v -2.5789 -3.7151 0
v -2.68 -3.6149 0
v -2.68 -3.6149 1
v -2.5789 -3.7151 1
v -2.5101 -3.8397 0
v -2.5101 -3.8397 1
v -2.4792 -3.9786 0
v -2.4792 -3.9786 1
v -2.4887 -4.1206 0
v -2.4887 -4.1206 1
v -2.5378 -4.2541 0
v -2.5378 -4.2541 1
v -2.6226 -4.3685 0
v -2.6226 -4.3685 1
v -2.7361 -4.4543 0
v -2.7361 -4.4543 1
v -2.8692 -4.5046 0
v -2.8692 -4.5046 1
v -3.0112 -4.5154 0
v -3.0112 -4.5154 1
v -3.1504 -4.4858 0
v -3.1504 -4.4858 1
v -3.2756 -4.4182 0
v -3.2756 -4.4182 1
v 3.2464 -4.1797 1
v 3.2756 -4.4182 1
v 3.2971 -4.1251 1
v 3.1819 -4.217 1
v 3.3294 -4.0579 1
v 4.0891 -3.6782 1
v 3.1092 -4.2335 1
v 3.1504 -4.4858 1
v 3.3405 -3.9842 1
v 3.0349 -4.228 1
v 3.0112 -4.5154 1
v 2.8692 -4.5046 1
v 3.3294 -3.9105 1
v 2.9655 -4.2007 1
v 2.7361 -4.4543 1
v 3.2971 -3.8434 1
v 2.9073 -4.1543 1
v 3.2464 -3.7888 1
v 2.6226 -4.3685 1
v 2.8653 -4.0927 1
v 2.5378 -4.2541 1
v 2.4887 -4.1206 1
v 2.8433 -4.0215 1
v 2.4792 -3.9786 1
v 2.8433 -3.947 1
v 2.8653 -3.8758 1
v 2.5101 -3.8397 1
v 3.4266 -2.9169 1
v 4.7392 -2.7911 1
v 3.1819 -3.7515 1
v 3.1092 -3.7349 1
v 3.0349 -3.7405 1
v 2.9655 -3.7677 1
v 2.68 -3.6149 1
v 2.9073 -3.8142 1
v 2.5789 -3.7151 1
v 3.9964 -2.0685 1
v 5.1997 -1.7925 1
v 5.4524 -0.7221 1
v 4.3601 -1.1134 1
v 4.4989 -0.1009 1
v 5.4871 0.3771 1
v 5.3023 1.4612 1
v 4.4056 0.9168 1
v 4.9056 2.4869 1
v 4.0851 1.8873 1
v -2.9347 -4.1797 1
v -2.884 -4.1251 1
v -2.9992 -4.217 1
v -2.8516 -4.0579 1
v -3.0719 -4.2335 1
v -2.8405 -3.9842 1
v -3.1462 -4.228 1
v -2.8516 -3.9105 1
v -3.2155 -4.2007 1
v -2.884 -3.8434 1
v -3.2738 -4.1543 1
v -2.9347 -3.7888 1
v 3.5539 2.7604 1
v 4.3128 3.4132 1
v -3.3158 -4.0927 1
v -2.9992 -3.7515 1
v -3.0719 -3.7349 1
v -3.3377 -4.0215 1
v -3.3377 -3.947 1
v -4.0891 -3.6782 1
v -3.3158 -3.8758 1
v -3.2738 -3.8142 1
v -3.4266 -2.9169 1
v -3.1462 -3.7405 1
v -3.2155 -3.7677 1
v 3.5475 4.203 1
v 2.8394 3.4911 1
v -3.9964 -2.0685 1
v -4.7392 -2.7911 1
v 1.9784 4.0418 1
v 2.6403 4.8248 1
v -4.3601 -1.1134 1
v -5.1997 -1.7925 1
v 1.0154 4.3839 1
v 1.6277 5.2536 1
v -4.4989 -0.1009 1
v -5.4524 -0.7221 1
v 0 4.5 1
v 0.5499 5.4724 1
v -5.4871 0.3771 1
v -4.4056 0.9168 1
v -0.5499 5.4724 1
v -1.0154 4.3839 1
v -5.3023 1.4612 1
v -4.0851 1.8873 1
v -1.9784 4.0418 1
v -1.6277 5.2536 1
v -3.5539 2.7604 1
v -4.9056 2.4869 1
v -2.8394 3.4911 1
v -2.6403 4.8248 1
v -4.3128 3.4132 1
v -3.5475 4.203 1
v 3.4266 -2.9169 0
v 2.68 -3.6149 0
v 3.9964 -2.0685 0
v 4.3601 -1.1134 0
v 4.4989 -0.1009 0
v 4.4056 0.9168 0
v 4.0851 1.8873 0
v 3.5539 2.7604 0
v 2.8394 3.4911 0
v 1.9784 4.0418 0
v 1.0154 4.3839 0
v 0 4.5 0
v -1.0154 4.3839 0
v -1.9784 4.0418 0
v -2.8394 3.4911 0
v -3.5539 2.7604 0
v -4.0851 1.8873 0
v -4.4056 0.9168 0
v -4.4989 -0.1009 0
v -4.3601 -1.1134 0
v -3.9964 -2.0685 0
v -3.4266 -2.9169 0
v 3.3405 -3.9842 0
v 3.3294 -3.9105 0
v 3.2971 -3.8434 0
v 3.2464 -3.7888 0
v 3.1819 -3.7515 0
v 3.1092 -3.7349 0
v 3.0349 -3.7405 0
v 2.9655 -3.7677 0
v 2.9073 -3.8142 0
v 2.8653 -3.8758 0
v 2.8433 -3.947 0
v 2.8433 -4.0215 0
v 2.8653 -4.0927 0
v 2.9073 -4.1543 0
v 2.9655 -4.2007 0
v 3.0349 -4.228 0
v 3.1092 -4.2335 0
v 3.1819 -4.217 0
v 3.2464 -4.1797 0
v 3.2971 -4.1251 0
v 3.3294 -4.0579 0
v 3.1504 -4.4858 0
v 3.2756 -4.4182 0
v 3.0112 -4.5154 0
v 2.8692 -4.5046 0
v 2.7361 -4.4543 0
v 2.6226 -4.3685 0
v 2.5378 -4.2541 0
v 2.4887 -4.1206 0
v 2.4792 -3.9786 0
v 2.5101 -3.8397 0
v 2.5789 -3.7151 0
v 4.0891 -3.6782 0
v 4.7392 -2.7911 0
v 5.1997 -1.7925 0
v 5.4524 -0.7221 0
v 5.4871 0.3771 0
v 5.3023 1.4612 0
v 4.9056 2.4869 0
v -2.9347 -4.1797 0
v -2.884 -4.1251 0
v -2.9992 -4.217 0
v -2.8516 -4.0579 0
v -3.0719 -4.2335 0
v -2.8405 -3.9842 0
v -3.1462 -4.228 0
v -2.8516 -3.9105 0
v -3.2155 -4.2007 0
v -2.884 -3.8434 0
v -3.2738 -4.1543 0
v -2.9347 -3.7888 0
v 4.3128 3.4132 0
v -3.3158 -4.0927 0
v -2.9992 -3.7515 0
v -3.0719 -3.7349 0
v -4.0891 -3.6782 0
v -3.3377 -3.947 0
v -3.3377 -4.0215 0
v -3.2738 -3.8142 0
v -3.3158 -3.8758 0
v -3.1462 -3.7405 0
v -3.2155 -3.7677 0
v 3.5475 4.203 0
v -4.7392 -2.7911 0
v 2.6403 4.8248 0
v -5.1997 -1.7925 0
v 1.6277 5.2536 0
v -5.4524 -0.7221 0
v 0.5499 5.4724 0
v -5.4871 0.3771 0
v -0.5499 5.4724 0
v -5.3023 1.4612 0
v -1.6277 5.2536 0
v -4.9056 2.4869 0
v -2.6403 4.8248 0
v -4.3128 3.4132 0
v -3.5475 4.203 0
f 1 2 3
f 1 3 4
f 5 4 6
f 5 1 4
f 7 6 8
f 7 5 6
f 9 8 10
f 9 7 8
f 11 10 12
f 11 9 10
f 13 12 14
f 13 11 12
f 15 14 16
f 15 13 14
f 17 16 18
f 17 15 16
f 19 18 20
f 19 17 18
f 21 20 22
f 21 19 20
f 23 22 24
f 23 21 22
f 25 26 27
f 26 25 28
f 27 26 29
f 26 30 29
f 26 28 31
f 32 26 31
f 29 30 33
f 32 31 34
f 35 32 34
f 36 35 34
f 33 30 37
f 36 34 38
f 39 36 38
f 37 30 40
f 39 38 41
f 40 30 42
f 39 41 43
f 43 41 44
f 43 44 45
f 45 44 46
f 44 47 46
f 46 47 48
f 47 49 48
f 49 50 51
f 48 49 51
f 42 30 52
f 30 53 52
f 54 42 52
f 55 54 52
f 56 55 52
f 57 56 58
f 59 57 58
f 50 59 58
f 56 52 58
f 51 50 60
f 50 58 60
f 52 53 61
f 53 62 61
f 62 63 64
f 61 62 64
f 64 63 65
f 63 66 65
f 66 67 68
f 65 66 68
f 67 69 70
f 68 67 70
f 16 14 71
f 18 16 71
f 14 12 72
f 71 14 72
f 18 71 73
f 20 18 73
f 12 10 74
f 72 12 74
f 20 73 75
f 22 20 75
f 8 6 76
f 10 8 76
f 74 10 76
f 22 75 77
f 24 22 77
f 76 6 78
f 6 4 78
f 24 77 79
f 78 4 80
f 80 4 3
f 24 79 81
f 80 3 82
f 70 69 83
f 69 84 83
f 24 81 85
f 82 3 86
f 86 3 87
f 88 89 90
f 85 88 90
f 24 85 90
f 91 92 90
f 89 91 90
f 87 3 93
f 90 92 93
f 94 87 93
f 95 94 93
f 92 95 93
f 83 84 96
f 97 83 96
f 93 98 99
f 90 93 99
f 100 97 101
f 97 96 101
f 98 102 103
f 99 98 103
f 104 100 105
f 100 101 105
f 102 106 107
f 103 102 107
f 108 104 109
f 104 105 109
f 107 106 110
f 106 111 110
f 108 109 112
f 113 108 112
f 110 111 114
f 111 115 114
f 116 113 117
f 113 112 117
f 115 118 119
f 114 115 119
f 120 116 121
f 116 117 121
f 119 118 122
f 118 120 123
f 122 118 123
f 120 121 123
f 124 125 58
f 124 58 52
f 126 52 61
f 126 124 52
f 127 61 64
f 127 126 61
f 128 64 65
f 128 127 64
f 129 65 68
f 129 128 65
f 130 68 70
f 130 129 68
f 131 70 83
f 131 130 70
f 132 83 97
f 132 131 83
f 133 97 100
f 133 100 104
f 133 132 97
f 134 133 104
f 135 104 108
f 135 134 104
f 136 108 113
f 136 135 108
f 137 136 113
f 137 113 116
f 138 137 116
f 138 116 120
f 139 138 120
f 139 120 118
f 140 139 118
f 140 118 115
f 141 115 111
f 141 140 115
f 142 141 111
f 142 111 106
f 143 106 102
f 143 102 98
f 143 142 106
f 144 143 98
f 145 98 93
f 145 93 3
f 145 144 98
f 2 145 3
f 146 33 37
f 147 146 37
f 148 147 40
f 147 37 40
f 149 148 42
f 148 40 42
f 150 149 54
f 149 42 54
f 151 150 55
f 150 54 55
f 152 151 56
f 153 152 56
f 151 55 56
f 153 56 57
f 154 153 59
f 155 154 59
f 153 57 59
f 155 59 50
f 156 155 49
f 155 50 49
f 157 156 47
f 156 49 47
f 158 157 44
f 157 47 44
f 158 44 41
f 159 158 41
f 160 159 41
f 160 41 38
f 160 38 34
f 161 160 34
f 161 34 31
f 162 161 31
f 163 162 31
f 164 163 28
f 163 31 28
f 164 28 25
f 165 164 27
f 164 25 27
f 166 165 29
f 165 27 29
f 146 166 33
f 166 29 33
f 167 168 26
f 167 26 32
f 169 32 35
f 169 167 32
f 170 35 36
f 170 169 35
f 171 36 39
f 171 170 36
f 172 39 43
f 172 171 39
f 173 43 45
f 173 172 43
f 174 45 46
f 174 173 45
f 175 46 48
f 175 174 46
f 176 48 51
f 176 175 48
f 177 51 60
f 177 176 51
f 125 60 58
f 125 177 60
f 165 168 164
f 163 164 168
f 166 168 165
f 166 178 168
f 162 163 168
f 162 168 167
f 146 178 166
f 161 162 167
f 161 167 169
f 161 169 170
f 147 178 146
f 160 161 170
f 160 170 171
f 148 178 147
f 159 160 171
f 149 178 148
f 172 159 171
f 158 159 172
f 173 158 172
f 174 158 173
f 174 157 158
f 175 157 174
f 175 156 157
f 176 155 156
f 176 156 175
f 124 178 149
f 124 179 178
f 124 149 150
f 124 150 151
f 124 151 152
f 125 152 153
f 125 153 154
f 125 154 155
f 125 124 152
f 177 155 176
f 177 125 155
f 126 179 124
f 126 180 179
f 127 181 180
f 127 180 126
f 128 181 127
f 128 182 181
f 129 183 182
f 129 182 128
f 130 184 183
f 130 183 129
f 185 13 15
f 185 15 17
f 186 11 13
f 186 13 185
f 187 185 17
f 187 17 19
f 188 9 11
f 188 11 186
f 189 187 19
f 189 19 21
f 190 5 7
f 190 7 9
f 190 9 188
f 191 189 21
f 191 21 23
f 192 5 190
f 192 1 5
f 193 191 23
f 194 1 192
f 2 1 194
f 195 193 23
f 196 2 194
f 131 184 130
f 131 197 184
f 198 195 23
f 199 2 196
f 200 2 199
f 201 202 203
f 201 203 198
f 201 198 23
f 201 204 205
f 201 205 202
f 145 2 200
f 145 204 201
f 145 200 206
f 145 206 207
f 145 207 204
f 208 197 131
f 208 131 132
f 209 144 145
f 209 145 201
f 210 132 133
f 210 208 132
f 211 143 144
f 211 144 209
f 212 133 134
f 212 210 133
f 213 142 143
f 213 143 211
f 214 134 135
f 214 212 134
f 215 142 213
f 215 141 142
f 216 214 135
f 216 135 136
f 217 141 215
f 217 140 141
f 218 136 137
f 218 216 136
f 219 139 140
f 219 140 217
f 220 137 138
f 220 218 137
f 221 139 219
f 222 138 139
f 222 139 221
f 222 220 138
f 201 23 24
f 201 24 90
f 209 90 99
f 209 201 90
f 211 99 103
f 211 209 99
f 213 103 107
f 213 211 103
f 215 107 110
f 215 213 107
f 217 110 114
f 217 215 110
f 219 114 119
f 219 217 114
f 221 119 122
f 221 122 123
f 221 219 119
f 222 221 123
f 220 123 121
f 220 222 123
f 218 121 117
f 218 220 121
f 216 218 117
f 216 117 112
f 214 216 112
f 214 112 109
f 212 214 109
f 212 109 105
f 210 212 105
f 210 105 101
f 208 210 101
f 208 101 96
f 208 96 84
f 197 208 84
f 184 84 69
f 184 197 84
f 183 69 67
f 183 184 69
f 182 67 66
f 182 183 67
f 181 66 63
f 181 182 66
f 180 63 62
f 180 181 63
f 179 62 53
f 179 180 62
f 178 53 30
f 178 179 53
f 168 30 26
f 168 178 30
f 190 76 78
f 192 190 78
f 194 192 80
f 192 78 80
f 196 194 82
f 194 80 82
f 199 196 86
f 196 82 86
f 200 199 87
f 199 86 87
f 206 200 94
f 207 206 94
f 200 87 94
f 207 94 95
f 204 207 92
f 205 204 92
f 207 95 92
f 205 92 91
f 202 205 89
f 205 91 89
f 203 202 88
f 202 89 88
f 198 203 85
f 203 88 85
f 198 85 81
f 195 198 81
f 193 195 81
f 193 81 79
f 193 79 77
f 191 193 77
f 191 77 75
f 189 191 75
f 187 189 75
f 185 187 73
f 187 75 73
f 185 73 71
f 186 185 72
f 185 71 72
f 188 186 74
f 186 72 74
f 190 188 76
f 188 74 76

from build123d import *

# Parameters (mm, degrees)
BOSS_EXTRUDE1_DEPTH = 1
SKETCH2_R           = 0.25
CUT_EXTRUDE1_DEPTH  = 1


with BuildPart() as part:
    # Sketch1 → Boss-Extrude1 (new body)
    with BuildSketch(Plane.XY):
        with BuildLine():
            ThreePointArc((2.680014273, -3.614902972), (0, 4.5), (-2.680014273, -3.614902972))
            ThreePointArc((-2.680014273, -3.614902972), (-2.57613775, -4.314338222), (-3.275573, -4.418214744))
            ThreePointArc((-3.275573, -4.418214744), (0, 5.5), (3.275573, -4.418214744))
            ThreePointArc((3.275573, -4.418214744), (2.57613775, -4.314338222), (2.680014273, -3.614902972))
        make_face()
    extrude(amount=BOSS_EXTRUDE1_DEPTH)

    # Sketch2 → Cut-Extrude1 (cut)
    with BuildSketch(Plane.XY.offset(1)):
        with Locations((-3.090538889, -3.984232302)):
            Circle(SKETCH2_R)
        with Locations((3.090538889, -3.984232302)):
            Circle(SKETCH2_R)
    extrude(amount=-CUT_EXTRUDE1_DEPTH, mode=Mode.SUBTRACT)


solid = part.part
